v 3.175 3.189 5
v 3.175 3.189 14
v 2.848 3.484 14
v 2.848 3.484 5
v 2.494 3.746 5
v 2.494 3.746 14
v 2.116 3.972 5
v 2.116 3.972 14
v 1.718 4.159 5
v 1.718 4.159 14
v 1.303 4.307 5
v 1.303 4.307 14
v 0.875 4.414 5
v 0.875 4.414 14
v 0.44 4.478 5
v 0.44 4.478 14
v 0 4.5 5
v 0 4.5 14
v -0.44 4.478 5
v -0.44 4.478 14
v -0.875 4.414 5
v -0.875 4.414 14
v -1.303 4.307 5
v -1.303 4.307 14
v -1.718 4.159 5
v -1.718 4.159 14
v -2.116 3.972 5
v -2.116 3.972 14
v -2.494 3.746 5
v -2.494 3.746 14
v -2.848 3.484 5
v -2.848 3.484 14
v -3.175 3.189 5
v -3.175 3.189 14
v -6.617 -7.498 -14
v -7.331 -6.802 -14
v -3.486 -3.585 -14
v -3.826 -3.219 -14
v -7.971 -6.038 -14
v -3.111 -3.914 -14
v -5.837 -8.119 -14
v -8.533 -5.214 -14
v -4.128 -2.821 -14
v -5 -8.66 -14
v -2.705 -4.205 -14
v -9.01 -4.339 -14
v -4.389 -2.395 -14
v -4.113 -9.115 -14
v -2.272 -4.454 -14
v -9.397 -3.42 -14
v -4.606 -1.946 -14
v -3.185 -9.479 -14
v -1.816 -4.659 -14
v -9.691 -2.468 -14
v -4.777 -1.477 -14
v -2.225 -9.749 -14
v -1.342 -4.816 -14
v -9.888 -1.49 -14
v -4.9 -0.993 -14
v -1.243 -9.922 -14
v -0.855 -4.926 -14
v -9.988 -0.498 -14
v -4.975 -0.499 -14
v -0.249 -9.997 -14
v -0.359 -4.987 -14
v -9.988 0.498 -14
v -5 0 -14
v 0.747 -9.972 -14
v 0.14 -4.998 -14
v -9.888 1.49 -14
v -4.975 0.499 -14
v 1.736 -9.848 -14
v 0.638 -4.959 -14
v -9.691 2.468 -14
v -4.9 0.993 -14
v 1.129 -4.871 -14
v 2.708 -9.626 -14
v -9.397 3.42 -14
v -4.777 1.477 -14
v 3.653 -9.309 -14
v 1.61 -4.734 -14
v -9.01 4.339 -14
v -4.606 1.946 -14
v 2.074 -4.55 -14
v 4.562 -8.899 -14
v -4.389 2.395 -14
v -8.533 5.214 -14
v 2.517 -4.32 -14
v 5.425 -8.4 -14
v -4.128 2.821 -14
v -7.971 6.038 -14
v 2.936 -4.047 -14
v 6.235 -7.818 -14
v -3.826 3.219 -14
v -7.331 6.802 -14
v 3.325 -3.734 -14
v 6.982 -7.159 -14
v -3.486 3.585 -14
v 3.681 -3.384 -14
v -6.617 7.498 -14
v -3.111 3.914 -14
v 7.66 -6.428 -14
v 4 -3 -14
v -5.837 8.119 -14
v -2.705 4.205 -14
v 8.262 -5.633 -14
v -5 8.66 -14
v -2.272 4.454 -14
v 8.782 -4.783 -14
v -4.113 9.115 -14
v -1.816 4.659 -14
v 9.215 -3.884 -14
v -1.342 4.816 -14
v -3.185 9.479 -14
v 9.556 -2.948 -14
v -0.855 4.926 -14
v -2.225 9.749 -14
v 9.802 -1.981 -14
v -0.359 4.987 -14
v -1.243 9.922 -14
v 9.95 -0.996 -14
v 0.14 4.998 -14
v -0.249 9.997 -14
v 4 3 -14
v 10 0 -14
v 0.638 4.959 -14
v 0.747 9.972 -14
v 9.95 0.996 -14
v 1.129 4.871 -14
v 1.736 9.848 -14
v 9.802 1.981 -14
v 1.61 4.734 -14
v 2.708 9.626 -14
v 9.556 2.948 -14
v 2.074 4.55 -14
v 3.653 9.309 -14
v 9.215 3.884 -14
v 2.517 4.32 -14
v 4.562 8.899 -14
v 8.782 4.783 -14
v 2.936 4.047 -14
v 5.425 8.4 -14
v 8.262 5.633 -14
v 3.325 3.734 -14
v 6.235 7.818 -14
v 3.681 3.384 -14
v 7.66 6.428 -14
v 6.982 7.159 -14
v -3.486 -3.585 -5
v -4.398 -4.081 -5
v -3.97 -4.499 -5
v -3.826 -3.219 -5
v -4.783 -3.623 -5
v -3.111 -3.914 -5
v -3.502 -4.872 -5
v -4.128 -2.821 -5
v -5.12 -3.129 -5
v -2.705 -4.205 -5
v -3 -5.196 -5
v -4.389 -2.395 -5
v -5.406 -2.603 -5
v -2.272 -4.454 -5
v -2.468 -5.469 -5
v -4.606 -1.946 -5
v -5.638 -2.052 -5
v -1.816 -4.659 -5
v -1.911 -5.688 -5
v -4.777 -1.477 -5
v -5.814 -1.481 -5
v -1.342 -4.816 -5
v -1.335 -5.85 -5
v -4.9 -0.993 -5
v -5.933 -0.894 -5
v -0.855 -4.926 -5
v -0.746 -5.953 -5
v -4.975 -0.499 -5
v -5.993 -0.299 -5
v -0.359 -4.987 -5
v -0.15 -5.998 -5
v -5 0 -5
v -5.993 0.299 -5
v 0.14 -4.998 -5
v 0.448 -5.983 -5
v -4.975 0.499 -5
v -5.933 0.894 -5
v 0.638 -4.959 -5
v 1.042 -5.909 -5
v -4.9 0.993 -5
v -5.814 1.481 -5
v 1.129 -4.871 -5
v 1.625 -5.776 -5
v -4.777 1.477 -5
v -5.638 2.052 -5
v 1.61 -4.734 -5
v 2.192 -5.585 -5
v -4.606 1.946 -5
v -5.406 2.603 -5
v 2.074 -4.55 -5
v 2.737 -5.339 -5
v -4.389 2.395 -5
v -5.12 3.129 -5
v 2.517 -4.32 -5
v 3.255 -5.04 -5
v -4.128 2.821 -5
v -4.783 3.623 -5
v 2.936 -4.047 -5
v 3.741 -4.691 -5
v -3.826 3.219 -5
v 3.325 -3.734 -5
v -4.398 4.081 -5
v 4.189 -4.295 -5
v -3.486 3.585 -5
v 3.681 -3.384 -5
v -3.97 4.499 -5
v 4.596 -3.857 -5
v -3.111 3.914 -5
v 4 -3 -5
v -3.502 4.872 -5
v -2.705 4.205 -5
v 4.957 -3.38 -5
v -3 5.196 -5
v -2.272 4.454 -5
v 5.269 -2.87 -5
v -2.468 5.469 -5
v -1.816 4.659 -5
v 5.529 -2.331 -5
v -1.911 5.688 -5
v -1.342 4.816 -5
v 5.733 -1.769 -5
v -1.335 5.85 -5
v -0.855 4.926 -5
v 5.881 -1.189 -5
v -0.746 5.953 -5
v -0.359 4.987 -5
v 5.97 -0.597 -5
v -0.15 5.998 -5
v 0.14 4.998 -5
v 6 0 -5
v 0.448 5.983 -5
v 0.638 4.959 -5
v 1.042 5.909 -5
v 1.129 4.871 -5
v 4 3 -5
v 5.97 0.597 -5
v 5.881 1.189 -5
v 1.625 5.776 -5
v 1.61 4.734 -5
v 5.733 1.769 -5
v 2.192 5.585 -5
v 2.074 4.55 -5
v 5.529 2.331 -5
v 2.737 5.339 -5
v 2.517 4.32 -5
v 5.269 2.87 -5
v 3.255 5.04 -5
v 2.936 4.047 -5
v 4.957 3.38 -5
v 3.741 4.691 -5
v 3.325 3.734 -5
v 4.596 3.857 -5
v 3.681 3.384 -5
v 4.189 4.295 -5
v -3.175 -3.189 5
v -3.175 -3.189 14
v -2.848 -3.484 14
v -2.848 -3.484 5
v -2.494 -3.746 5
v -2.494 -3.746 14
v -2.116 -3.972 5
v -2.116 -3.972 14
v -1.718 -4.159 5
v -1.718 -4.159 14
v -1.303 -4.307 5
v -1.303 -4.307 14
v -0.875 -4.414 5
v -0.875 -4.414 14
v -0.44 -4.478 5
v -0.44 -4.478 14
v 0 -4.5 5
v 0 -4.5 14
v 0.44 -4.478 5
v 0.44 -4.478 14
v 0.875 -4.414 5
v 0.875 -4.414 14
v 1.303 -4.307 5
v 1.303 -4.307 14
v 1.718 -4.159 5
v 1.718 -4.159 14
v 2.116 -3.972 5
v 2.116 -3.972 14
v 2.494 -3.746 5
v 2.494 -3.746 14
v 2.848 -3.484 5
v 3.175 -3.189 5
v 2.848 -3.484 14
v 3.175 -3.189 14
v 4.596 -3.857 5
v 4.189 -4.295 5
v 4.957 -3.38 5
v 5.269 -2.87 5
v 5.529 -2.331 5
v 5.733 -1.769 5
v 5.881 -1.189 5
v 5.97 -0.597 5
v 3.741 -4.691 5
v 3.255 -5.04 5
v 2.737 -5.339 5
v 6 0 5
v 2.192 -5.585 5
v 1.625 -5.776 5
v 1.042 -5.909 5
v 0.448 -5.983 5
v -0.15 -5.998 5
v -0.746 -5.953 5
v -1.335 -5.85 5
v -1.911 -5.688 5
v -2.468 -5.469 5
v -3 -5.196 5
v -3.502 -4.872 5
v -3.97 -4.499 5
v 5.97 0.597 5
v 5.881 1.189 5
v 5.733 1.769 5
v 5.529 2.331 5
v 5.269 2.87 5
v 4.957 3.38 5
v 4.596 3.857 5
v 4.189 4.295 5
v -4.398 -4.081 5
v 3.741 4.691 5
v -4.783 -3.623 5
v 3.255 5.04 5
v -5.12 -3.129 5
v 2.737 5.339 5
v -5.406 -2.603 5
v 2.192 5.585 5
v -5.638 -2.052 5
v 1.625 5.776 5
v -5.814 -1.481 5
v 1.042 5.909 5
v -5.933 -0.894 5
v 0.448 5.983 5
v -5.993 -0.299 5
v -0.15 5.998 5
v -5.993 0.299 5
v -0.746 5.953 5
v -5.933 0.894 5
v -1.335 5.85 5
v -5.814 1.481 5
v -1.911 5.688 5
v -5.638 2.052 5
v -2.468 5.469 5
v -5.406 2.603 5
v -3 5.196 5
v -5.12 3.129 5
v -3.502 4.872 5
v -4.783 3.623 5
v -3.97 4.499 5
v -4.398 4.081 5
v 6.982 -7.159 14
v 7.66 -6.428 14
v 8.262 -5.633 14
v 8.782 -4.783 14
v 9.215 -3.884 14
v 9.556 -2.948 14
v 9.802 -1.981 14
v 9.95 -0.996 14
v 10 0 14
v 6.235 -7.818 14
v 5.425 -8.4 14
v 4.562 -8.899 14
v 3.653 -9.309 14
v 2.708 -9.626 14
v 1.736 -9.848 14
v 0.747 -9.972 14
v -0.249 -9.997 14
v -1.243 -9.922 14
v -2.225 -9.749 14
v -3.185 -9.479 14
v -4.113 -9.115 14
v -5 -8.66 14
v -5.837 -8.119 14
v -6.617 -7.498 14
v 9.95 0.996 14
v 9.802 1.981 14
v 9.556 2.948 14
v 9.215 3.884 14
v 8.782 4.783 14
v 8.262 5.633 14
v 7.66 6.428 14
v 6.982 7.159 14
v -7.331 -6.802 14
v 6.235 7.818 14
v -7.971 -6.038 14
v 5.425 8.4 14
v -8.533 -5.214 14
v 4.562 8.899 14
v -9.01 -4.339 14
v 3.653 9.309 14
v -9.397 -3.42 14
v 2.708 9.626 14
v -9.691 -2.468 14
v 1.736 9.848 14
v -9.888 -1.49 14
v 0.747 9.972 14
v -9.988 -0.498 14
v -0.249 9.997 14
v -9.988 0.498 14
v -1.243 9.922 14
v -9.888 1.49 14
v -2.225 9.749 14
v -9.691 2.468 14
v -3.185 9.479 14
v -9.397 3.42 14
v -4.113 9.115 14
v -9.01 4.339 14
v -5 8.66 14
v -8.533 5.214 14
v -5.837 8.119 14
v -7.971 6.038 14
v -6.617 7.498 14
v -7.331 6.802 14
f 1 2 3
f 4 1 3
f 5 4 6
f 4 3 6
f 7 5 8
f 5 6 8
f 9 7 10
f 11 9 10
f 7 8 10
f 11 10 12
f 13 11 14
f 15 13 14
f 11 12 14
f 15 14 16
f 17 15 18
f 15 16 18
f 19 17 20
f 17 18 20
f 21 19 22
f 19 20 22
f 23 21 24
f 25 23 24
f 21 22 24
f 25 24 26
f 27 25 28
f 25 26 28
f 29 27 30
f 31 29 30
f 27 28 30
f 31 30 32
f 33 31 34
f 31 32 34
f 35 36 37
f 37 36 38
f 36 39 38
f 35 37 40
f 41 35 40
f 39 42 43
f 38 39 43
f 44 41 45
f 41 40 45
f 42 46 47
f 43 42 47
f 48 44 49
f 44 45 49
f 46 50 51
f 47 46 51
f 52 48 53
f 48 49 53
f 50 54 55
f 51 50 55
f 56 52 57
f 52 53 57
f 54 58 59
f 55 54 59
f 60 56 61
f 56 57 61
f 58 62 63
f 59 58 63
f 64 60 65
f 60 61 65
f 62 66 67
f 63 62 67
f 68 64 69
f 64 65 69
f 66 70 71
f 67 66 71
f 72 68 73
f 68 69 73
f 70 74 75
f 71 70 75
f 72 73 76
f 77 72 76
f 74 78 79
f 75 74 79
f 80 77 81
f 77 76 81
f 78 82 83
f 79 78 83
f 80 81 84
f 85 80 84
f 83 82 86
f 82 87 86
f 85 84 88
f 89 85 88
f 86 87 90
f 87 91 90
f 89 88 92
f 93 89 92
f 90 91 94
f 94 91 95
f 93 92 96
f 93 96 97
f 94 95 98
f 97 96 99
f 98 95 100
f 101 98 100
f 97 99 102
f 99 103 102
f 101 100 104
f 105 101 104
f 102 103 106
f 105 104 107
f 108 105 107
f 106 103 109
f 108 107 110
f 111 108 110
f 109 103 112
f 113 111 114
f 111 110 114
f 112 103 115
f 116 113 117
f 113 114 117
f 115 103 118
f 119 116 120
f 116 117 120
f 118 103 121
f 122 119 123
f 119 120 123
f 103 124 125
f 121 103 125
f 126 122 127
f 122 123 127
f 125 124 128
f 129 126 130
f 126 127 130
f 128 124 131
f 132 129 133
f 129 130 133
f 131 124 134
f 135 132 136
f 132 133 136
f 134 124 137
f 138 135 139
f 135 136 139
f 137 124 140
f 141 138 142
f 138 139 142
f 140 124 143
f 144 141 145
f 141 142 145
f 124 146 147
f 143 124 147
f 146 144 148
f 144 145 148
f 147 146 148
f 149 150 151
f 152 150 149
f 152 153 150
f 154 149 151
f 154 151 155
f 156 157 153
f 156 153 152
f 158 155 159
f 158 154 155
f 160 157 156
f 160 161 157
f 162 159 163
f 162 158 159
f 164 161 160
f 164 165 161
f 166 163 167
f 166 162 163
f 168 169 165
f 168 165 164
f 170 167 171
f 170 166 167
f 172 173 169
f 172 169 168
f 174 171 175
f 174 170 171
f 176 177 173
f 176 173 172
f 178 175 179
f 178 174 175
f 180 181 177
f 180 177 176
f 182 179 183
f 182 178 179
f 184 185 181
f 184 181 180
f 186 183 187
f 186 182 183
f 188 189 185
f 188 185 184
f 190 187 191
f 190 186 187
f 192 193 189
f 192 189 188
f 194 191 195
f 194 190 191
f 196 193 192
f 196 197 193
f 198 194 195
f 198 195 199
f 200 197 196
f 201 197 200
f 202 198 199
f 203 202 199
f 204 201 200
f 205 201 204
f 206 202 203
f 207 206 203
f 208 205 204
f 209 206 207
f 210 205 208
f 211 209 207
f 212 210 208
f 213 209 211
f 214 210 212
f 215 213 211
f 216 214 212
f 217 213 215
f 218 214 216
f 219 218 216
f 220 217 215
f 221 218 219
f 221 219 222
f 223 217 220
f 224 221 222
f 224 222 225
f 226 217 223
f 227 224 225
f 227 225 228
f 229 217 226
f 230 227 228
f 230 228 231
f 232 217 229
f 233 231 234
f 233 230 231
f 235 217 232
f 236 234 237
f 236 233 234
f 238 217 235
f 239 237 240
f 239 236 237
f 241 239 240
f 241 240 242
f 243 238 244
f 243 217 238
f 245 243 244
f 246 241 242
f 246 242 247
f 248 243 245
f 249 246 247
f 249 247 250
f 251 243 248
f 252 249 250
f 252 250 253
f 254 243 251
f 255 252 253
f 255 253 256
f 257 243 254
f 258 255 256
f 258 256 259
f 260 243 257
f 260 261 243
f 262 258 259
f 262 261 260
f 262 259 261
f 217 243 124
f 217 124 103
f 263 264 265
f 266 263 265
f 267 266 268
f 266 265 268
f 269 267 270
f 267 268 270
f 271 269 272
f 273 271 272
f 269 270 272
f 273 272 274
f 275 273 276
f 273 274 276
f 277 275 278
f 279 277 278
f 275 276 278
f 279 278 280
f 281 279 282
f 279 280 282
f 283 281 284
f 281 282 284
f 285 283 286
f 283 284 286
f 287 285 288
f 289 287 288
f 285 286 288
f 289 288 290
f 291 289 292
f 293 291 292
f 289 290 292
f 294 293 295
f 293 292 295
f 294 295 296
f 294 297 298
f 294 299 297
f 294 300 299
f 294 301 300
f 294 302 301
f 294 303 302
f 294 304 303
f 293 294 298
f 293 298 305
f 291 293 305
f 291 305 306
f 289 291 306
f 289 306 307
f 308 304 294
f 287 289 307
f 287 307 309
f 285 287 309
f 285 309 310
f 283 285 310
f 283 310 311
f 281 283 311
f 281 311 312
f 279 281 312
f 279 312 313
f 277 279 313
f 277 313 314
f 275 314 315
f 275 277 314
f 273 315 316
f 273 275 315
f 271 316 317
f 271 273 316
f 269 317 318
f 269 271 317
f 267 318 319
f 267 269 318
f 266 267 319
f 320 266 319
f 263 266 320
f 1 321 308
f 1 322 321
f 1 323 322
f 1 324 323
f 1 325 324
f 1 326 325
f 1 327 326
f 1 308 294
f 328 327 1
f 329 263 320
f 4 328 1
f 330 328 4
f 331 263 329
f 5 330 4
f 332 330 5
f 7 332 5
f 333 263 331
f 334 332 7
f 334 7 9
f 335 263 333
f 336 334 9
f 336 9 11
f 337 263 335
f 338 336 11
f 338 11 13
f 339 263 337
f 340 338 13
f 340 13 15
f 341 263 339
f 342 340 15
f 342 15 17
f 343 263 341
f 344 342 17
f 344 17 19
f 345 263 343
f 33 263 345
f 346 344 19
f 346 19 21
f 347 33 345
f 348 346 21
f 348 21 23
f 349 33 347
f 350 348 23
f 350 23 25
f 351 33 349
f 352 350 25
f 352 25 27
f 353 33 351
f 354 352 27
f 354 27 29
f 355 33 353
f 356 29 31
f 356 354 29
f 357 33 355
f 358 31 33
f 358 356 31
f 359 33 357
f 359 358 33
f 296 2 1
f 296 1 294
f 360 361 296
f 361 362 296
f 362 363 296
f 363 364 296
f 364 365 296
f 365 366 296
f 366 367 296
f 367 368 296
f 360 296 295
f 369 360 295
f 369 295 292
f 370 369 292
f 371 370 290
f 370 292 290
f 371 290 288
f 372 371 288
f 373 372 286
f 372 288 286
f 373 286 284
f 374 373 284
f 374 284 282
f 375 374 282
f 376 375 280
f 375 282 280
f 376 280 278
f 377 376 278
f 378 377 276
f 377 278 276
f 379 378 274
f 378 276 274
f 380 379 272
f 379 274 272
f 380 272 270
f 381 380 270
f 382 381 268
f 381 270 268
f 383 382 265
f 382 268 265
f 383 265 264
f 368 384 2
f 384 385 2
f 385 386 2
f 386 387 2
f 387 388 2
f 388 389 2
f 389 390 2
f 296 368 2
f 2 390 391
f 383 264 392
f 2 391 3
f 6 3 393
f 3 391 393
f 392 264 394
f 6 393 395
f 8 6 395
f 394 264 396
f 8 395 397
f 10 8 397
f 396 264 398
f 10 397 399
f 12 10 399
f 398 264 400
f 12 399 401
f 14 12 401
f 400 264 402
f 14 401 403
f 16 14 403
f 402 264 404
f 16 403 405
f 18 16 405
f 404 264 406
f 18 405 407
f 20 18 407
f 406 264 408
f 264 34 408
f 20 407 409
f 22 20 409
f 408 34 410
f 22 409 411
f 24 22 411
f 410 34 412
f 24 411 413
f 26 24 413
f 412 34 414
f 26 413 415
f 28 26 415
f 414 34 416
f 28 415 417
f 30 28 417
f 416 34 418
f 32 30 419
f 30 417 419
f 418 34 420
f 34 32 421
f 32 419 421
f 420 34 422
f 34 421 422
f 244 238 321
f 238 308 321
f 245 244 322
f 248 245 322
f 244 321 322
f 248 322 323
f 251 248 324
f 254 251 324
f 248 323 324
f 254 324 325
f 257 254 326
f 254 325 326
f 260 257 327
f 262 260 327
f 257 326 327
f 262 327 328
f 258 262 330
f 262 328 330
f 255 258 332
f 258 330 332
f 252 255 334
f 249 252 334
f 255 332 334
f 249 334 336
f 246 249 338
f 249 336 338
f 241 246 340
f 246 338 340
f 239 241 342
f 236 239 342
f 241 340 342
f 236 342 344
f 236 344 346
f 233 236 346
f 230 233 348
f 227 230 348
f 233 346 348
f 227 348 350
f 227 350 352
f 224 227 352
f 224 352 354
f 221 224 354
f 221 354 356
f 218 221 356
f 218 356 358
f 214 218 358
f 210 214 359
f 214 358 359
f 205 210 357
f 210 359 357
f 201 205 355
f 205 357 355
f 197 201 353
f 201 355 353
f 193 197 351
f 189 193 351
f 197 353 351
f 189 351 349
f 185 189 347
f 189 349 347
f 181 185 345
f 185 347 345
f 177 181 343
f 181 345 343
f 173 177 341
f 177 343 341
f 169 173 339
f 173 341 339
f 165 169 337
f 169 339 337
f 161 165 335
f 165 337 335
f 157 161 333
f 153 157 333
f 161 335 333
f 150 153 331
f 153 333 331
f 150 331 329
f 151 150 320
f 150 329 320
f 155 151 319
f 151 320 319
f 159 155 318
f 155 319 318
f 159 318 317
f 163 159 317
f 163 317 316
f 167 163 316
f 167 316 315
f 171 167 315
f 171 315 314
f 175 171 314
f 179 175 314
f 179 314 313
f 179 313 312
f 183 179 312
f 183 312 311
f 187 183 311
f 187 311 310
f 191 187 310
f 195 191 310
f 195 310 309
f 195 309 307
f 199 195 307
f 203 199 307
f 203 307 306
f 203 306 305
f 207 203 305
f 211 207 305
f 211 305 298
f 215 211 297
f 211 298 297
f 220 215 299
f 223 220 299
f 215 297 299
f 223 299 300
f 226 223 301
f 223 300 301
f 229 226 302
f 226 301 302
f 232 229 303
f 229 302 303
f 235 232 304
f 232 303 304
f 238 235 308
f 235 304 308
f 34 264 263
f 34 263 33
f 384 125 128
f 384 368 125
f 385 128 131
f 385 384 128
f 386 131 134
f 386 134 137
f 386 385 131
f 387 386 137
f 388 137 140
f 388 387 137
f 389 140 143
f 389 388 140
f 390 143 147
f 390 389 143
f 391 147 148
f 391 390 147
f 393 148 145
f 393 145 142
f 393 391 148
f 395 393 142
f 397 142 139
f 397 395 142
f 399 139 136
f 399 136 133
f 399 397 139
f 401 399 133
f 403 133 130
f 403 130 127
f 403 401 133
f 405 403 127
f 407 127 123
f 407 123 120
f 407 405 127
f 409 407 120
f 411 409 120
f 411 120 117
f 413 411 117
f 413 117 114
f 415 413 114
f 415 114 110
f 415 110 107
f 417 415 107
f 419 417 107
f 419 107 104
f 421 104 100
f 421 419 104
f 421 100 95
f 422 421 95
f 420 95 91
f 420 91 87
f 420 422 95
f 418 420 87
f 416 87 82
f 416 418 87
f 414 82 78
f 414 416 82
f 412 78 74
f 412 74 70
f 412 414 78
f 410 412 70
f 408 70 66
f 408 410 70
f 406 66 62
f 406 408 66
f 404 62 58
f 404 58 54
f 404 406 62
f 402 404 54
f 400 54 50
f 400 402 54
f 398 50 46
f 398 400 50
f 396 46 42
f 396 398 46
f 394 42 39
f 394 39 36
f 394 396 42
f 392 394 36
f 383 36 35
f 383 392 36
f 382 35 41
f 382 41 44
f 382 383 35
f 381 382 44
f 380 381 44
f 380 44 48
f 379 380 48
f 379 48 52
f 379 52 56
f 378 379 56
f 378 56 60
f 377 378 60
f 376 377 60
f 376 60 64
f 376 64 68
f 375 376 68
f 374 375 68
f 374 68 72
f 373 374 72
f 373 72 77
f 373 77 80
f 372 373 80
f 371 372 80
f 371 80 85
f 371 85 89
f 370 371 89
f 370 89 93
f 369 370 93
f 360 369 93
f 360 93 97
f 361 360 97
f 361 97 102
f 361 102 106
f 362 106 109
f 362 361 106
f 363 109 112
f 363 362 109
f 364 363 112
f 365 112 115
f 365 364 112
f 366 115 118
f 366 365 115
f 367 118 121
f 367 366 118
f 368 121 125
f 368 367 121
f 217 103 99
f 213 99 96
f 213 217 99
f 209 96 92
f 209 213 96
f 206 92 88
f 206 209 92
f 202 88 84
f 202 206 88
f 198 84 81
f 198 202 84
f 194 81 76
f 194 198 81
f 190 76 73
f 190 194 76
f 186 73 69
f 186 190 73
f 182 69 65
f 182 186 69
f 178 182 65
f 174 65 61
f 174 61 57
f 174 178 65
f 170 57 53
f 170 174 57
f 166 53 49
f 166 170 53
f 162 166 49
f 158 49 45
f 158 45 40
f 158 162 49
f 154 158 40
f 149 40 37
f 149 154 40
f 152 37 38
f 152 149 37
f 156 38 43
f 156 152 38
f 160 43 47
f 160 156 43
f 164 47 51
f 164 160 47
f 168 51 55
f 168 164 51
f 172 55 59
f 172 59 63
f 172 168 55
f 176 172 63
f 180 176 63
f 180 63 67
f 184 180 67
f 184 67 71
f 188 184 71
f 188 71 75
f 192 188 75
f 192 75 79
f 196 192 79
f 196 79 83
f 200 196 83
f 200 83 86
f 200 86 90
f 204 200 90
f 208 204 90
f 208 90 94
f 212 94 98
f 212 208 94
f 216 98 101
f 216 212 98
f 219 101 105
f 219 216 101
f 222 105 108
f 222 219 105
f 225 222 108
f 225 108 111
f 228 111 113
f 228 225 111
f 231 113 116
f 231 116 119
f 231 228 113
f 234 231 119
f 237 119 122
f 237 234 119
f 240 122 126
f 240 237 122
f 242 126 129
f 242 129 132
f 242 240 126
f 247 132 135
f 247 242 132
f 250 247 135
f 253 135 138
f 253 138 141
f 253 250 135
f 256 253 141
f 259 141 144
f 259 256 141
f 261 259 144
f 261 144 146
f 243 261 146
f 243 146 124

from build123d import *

# Parameters (mm, degrees)
SKETCH_1_R          = 10
EXTRUDE_1_DEPTH     = 14
SKETCH_3_R          = 6
CUT_EXTRUDE_1_DEPTH = 5
SKETCH_2_R          = 4.5
EXTRUDE_2_DEPTH     = 9


with BuildPart() as part:
    # 草图1 → 凸台-拉伸1 (new, symmetric)
    with BuildSketch(Plane.XY):
        Circle(SKETCH_1_R)
        with BuildLine():
            Line((4, 3), (4, -3))
            ThreePointArc((4, -3), (-5, 0), (4, 3))
        make_face(mode=Mode.SUBTRACT)
    extrude(amount=EXTRUDE_1_DEPTH, both=True)

    # 草图3 → 切除-拉伸1 (cut, symmetric)
    with BuildSketch(Plane.XY):
        Circle(SKETCH_3_R)
    extrude(amount=CUT_EXTRUDE_1_DEPTH, both=True, mode=Mode.SUBTRACT)

    # 草图2 → 凸台-拉伸2 (add)
    # profile 1 of 4: a face of its own
    with BuildSketch(Plane.XY.offset(14)):
        with BuildLine():
            Line((4, 3), (4, -3))
            ThreePointArc((4, -3), (-5, 0), (4, 3))
        make_face()
        Circle(SKETCH_2_R, mode=Mode.SUBTRACT)
    # profile 2 of 4: a face of its own
    with BuildSketch(Plane.XY.offset(14)):
        with BuildLine():
            ThreePointArc((-3.175, 3.188945751), (-4.5, 0), (-3.175, -3.188945751))
            Line((-3.175, -3.188945751), (-3.175, 3.188945751))
        make_face()
    # profile 3 of 4: a face of its own
    with BuildSketch(Plane.XY.offset(14)):
        with BuildLine():
            Line((4, 2.061552813), (4, -2.061552813))
            ThreePointArc((4, -2.061552813), (4.373213921, -1.060660172), (4.5, 0))
            ThreePointArc((4.5, 0), (4.373213921, 1.060660172), (4, 2.061552813))
        make_face()
    # profile 4 of 4: a face of its own
    with BuildSketch(Plane.XY.offset(14)):
        with BuildLine():
            ThreePointArc((3.175, -3.188945751), (3.631516207, -2.657459321), (4, -2.061552813))
            Line((4, -2.061552813), (4, 2.061552813))
            ThreePointArc((4, 2.061552813), (3.631516207, 2.657459321), (3.175, 3.188945751))
            Line((3.175, 3.188945751), (3.175, -3.188945751))
        make_face()
    extrude(amount=-EXTRUDE_2_DEPTH)


solid = part.part
